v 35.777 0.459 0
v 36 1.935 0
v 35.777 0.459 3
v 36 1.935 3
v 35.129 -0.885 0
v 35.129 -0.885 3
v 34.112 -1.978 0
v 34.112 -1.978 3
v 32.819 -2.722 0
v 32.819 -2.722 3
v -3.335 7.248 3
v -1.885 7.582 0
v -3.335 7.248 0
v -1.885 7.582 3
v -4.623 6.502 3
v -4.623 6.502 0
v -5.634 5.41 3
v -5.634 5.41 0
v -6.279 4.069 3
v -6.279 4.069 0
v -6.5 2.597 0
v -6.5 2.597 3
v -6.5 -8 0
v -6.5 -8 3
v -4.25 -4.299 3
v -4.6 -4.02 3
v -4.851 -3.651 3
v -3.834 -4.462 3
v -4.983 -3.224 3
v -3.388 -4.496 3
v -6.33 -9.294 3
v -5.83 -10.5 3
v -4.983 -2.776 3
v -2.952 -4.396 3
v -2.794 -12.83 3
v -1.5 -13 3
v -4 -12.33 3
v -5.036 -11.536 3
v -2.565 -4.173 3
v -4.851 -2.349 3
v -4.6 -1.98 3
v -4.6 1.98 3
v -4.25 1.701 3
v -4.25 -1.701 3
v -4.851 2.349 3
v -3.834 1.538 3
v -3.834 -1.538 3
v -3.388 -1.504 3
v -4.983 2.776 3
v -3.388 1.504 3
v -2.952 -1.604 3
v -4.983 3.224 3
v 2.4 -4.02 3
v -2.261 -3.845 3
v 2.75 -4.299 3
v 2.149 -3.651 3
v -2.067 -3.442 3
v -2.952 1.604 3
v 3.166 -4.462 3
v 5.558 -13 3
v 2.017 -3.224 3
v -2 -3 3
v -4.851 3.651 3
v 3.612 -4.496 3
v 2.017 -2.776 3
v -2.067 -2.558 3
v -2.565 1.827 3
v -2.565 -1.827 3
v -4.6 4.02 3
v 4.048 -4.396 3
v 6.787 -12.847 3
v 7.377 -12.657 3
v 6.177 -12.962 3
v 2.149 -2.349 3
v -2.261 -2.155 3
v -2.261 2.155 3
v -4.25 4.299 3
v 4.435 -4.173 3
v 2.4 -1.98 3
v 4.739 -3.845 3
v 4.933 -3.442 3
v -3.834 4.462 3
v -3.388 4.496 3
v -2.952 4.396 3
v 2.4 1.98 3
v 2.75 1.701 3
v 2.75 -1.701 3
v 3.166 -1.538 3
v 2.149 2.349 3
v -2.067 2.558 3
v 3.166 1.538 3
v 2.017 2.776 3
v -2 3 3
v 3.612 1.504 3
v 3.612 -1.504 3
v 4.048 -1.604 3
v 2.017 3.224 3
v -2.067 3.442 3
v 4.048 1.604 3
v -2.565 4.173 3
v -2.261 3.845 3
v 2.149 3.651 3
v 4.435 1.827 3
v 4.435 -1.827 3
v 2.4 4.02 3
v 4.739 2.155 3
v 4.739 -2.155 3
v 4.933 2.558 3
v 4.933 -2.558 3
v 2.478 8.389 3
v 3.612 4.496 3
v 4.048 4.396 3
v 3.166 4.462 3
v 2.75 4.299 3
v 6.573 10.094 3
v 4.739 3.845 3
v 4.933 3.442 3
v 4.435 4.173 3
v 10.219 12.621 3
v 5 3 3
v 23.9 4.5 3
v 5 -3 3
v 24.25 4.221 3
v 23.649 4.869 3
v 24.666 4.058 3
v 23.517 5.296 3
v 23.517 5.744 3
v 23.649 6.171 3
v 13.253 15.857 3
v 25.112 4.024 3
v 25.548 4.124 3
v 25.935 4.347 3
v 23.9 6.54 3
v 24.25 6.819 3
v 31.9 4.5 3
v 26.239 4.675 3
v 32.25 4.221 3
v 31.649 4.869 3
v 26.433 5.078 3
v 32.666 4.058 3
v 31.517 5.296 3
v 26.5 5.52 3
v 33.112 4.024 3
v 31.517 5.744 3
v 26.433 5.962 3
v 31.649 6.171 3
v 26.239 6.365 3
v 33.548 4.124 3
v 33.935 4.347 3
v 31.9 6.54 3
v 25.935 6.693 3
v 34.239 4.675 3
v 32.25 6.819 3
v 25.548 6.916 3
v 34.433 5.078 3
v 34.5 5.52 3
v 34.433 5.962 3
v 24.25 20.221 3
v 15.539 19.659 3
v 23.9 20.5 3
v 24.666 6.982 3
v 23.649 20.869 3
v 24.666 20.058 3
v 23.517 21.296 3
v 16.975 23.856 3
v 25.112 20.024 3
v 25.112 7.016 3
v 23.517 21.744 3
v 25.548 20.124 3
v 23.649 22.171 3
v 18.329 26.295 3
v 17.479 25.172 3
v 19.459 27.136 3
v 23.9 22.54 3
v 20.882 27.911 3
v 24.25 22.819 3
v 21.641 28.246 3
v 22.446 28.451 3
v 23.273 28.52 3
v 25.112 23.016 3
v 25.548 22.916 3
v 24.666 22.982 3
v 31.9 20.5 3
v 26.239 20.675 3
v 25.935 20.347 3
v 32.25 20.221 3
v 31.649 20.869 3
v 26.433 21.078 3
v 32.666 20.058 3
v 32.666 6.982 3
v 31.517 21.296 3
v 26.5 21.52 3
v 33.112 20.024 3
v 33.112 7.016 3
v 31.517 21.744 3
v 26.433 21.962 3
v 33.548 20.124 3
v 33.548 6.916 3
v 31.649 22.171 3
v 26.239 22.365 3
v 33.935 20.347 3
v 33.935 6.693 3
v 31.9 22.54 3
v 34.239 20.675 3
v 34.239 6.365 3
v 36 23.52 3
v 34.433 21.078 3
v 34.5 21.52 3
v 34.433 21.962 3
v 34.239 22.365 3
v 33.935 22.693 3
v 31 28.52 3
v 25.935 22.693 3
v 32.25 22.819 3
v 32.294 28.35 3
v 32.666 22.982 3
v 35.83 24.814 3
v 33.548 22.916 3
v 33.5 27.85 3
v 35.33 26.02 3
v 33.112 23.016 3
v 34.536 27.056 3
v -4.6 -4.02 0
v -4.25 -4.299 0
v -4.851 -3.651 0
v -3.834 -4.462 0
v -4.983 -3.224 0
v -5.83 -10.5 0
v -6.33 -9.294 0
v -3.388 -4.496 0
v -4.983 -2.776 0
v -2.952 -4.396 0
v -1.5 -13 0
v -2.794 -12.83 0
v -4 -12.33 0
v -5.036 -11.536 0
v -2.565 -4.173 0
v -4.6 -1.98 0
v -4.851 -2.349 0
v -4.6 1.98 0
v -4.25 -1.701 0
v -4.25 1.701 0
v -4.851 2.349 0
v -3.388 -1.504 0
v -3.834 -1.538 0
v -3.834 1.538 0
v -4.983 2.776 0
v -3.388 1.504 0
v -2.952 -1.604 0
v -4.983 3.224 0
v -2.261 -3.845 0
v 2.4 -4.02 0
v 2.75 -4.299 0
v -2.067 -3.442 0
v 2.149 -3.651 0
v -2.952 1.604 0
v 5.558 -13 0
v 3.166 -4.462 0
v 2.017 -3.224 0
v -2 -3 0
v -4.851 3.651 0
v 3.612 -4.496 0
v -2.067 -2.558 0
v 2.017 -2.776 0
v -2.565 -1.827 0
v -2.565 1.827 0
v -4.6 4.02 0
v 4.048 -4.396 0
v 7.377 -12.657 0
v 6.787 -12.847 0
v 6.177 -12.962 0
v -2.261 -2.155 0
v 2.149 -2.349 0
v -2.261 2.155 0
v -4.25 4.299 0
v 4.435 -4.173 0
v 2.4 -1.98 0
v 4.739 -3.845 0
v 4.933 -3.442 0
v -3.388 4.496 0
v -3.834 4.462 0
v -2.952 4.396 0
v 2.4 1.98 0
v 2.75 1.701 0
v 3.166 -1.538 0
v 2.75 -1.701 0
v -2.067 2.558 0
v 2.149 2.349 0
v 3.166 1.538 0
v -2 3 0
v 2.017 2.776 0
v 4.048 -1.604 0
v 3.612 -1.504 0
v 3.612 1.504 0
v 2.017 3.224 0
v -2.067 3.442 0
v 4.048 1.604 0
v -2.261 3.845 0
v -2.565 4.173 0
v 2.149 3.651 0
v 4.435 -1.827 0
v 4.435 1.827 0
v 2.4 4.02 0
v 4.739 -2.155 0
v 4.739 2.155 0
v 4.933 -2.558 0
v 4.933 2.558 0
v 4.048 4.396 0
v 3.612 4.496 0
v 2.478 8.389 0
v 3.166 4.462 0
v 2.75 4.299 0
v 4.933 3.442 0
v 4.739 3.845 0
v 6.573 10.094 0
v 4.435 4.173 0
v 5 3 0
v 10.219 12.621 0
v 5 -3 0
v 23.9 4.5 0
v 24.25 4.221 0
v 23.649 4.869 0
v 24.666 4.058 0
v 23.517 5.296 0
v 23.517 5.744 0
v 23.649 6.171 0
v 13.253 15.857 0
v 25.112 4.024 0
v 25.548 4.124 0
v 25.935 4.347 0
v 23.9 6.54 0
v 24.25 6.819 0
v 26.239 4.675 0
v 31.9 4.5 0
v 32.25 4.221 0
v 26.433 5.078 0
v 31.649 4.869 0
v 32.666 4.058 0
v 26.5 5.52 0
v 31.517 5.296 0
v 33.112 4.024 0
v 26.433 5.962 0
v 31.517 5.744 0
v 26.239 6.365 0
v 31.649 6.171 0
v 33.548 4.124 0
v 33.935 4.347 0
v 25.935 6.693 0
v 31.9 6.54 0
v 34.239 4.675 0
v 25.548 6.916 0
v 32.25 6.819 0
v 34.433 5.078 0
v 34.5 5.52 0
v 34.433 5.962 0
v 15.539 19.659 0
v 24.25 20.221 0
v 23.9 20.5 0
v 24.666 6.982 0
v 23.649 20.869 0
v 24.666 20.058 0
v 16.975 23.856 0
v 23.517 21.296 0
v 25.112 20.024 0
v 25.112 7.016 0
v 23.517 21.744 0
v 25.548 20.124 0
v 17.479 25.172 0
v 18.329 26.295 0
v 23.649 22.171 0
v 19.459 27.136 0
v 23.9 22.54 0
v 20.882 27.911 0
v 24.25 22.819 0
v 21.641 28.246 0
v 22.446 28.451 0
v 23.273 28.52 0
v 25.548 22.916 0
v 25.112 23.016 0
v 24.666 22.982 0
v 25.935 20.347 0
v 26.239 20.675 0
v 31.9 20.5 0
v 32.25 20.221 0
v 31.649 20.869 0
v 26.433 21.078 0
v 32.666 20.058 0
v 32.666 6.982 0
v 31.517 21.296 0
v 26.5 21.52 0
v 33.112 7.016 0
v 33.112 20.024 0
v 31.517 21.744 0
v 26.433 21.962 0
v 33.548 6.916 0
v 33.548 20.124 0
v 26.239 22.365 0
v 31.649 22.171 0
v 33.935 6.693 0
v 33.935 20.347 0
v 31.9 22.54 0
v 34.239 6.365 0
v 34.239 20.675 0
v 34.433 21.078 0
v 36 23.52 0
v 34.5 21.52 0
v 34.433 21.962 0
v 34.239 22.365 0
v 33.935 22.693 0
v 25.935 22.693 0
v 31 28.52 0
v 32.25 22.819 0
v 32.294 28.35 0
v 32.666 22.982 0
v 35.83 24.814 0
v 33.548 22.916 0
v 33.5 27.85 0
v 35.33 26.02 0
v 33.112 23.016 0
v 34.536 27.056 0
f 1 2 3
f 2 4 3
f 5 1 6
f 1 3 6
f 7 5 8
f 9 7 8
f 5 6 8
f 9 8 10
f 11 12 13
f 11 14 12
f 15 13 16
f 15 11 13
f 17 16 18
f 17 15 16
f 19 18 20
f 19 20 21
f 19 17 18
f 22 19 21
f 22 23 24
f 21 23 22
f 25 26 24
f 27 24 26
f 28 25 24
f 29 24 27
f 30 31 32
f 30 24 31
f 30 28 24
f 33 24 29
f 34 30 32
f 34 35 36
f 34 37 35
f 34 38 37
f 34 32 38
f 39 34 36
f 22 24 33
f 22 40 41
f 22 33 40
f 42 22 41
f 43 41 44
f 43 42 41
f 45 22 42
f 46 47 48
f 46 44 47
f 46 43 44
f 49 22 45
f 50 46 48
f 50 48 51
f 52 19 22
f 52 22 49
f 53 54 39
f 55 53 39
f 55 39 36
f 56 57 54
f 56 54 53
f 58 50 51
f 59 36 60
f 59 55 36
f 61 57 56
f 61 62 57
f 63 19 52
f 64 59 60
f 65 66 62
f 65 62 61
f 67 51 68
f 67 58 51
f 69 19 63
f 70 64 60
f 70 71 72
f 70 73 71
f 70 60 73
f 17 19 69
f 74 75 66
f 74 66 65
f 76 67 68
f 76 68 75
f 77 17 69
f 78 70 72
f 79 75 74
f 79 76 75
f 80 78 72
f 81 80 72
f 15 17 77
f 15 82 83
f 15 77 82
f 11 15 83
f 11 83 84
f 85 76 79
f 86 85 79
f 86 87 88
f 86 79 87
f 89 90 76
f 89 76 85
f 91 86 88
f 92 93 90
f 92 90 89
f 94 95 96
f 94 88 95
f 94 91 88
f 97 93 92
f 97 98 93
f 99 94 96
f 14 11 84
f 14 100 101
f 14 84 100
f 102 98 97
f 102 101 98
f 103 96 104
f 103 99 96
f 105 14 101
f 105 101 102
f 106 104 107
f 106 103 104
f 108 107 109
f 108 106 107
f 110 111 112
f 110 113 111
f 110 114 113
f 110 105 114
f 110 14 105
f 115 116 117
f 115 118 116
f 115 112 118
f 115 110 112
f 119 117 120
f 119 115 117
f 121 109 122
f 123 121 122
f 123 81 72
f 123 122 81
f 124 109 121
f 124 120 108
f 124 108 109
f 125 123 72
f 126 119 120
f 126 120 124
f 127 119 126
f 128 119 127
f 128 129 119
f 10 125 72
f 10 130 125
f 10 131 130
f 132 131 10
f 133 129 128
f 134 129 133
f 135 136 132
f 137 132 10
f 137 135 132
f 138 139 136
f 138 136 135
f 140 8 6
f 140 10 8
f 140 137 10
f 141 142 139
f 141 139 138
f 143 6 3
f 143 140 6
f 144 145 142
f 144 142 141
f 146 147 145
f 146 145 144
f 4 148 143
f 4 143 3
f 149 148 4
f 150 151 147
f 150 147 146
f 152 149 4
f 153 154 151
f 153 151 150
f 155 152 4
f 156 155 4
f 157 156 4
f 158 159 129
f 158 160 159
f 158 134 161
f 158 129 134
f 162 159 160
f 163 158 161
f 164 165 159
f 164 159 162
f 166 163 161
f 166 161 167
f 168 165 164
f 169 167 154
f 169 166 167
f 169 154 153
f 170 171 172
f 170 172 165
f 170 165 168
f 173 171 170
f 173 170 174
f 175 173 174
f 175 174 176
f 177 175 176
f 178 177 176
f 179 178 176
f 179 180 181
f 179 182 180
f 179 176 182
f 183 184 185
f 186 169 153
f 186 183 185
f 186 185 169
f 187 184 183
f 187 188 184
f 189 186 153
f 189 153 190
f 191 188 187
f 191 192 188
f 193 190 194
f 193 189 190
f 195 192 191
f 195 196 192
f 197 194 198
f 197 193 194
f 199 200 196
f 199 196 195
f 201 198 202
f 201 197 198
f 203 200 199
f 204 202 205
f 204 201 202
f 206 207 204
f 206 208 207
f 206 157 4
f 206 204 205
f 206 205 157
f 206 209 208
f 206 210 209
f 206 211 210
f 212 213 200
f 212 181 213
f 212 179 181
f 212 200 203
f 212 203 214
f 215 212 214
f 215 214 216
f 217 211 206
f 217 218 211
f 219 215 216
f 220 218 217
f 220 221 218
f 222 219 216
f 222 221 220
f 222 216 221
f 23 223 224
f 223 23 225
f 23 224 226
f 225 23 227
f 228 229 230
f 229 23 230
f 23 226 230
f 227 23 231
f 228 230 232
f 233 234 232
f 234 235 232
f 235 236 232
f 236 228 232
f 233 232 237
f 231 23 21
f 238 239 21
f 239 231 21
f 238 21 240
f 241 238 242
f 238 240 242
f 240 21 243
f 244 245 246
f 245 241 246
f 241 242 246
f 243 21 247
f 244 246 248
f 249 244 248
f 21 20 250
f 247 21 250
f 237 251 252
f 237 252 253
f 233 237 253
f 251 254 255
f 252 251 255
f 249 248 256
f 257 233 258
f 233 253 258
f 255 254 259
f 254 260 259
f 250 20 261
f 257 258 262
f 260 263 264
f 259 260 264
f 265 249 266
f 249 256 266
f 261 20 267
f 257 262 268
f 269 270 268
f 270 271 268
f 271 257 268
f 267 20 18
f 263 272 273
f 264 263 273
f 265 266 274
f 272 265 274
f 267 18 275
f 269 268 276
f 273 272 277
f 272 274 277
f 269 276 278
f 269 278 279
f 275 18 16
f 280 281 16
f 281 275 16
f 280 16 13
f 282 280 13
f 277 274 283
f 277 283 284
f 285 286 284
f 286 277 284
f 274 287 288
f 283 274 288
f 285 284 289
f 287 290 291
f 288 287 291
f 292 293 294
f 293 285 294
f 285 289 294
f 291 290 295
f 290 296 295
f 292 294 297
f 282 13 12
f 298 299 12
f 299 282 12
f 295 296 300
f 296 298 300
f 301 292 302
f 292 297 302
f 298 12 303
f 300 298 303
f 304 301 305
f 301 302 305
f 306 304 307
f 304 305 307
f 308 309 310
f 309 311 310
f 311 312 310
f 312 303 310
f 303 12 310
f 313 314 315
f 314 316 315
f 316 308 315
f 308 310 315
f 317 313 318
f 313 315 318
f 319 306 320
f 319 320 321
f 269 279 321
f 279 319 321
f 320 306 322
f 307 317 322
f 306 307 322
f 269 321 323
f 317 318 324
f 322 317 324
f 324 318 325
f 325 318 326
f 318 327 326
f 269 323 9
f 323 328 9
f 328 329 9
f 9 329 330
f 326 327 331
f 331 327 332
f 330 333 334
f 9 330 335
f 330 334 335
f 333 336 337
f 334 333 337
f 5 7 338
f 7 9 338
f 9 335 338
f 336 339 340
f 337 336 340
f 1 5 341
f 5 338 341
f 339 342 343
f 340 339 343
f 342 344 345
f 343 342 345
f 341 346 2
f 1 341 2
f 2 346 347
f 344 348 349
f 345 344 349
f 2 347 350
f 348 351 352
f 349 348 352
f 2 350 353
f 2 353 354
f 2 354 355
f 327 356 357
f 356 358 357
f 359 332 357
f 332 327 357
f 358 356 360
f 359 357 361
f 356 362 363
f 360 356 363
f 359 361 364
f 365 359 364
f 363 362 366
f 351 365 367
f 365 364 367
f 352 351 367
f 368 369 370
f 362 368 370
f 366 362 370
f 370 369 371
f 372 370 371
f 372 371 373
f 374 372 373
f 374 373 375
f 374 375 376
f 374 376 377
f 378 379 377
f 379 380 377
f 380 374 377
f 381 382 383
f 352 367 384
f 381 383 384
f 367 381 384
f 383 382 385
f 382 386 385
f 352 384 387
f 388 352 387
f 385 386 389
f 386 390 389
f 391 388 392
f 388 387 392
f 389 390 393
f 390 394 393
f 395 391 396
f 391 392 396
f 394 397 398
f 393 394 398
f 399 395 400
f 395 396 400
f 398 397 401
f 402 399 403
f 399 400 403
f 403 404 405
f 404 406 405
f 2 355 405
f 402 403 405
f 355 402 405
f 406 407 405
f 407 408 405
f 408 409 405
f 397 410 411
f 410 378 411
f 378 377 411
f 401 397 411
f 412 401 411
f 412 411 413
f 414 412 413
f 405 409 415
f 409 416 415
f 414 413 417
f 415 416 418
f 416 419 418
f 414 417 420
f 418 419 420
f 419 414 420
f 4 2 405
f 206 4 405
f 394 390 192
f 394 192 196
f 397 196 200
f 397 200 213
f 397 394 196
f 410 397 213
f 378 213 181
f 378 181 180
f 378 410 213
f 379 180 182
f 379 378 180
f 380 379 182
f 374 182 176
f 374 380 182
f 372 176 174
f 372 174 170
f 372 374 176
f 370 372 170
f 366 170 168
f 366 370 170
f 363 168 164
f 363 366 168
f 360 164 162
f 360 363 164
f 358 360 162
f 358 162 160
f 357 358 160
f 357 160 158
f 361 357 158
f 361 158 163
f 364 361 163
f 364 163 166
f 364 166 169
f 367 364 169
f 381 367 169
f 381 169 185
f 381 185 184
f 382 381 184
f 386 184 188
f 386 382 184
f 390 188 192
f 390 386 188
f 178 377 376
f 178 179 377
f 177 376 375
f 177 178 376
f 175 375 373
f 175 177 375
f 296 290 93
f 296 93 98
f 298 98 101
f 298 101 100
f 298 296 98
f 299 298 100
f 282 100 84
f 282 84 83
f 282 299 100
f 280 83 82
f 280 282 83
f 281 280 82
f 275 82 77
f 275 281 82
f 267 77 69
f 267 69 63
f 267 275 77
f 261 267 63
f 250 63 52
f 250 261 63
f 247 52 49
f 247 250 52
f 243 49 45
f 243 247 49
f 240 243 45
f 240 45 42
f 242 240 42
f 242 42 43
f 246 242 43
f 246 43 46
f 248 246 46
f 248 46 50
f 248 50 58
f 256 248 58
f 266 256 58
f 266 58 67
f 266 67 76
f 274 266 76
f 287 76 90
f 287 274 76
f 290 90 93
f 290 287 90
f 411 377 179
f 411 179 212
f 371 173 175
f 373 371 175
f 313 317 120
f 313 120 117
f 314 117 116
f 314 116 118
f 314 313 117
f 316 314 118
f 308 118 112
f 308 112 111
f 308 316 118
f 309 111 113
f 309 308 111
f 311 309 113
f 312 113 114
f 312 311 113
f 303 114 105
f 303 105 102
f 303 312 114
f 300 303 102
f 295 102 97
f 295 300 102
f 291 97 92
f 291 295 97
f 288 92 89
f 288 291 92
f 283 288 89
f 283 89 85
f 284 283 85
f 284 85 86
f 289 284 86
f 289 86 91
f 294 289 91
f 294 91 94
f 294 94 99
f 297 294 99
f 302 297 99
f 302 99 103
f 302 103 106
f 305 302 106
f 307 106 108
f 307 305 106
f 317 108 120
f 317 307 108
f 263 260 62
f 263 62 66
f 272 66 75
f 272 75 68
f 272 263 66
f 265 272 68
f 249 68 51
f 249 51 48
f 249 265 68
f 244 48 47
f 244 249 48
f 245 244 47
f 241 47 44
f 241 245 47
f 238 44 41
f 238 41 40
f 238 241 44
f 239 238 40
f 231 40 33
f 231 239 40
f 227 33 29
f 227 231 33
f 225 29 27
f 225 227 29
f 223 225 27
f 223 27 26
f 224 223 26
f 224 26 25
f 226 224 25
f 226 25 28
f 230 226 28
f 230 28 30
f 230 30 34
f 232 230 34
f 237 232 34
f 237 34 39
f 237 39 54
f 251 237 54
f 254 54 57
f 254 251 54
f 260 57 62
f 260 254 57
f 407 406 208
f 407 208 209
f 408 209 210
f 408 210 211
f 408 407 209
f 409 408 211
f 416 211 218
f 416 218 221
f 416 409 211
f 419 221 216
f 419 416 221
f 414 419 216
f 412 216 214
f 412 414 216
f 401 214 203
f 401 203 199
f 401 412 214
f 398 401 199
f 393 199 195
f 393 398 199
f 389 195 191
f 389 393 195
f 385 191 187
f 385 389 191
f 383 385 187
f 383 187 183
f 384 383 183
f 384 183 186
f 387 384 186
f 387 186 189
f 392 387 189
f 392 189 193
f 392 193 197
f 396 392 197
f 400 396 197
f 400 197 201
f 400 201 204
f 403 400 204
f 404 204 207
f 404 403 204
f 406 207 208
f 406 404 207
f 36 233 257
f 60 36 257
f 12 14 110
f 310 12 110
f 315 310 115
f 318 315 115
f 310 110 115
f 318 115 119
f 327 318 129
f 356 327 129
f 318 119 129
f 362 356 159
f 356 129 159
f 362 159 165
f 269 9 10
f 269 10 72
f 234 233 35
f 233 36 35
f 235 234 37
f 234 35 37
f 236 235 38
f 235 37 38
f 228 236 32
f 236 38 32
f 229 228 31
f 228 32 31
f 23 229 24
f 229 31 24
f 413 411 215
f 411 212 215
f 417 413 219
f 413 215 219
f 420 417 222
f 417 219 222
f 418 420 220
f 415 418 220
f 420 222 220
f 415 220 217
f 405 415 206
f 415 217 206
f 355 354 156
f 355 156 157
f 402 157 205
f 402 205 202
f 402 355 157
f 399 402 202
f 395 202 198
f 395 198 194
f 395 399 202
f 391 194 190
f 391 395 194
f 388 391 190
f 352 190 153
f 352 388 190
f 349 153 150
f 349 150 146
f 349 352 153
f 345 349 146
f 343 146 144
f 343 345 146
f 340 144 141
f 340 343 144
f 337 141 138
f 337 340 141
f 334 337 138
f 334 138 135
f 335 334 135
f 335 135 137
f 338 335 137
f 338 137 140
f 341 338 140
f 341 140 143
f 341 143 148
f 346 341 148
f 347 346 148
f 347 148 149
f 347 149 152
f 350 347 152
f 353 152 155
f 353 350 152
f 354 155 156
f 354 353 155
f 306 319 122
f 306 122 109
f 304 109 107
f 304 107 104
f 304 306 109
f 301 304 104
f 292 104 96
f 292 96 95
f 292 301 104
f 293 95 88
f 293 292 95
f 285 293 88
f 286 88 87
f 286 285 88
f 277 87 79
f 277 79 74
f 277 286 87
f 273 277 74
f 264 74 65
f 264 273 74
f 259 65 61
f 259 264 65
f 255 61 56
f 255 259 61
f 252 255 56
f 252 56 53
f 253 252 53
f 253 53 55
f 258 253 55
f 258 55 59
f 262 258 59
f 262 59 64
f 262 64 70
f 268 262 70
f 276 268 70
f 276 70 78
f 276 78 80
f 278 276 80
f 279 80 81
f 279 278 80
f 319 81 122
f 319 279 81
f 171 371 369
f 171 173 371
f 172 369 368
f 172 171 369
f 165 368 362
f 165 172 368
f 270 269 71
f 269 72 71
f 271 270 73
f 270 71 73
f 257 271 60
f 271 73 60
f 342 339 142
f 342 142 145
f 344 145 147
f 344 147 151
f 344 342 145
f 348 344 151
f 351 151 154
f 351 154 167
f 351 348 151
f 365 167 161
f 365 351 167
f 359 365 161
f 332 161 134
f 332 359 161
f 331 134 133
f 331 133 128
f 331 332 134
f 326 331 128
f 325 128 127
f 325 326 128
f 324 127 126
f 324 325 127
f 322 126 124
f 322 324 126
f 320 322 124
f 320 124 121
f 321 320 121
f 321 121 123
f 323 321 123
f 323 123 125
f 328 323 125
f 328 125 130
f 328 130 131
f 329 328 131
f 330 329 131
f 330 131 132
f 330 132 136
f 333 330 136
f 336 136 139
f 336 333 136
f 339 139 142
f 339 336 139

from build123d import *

# Parameters (mm, degrees)
SKETCH_1_W          = 13
SKETCH_1_H          = 26
SKETCH_1_R          = 1.5
SKETCH_1_W_2        = 14
SKETCH_1_H_2        = 30
EXTRUDE_1_DEPTH     = 3
SKETCH_2_R          = 21
CUT_EXTRUDE_1_DEPTH = 3
FILLET_1_R          = 5


with BuildPart() as part:
    # 草图1 → 凸台-拉伸1 (new body)
    # profile 1 of 3: a face of its own
    with BuildSketch(Plane.XY):
        Rectangle(SKETCH_1_W, SKETCH_1_H)
        with Locations((-3.5, 3)):
            Circle(SKETCH_1_R, mode=Mode.SUBTRACT)
        with Locations((-3.5, -3)):
            Circle(SKETCH_1_R, mode=Mode.SUBTRACT)
        with Locations((3.5, -3)):
            Circle(SKETCH_1_R, mode=Mode.SUBTRACT)
        with Locations((3.5, 3)):
            Circle(SKETCH_1_R, mode=Mode.SUBTRACT)
    # profile 2 of 3: a face of its own
    with BuildSketch(Plane.XY):
        Polygon((22, 28.52), (22, -1.48), (36, -1.48), (6.5, -13), (6.5, 13), (-6.5, 13), align=None)
    # profile 3 of 3: a face of its own
    with BuildSketch(Plane.XY):
        with Locations((29, 13.52)):
            Rectangle(SKETCH_1_W_2, SKETCH_1_H_2)
        with Locations((25, 21.52)):
            Circle(SKETCH_1_R, mode=Mode.SUBTRACT)
        with Locations((25, 5.52)):
            Circle(SKETCH_1_R, mode=Mode.SUBTRACT)
        with Locations((33, 5.52)):
            Circle(SKETCH_1_R, mode=Mode.SUBTRACT)
        with Locations((33, 21.52)):
            Circle(SKETCH_1_R, mode=Mode.SUBTRACT)
    extrude(amount=EXTRUDE_1_DEPTH)

    # 草图2 → 切除-拉伸1 (cut)
    with BuildSketch(Plane.XY.offset(3)):
        with Locations((-3.5, 28.52)):
            Circle(SKETCH_2_R)
    extrude(amount=-CUT_EXTRUDE_1_DEPTH, mode=Mode.SUBTRACT)

    # 圆角1
    fillet_1_edges = [part.edges().sort_by_distance(p)[0] for p in [
        (-6.5, -13, 1.5),
        (22, 28.52, 1.5),
        (36, 28.52, 1.5),
        (36, -1.48, 1.5),
        (6.5, -13, 1.5),
        (17.346543443, 25.985907166, 1.5),
        (-6.5, 7.735390309, 1.5),
    ]]
    fillet(fillet_1_edges, radius=FILLET_1_R)


solid = part.part
